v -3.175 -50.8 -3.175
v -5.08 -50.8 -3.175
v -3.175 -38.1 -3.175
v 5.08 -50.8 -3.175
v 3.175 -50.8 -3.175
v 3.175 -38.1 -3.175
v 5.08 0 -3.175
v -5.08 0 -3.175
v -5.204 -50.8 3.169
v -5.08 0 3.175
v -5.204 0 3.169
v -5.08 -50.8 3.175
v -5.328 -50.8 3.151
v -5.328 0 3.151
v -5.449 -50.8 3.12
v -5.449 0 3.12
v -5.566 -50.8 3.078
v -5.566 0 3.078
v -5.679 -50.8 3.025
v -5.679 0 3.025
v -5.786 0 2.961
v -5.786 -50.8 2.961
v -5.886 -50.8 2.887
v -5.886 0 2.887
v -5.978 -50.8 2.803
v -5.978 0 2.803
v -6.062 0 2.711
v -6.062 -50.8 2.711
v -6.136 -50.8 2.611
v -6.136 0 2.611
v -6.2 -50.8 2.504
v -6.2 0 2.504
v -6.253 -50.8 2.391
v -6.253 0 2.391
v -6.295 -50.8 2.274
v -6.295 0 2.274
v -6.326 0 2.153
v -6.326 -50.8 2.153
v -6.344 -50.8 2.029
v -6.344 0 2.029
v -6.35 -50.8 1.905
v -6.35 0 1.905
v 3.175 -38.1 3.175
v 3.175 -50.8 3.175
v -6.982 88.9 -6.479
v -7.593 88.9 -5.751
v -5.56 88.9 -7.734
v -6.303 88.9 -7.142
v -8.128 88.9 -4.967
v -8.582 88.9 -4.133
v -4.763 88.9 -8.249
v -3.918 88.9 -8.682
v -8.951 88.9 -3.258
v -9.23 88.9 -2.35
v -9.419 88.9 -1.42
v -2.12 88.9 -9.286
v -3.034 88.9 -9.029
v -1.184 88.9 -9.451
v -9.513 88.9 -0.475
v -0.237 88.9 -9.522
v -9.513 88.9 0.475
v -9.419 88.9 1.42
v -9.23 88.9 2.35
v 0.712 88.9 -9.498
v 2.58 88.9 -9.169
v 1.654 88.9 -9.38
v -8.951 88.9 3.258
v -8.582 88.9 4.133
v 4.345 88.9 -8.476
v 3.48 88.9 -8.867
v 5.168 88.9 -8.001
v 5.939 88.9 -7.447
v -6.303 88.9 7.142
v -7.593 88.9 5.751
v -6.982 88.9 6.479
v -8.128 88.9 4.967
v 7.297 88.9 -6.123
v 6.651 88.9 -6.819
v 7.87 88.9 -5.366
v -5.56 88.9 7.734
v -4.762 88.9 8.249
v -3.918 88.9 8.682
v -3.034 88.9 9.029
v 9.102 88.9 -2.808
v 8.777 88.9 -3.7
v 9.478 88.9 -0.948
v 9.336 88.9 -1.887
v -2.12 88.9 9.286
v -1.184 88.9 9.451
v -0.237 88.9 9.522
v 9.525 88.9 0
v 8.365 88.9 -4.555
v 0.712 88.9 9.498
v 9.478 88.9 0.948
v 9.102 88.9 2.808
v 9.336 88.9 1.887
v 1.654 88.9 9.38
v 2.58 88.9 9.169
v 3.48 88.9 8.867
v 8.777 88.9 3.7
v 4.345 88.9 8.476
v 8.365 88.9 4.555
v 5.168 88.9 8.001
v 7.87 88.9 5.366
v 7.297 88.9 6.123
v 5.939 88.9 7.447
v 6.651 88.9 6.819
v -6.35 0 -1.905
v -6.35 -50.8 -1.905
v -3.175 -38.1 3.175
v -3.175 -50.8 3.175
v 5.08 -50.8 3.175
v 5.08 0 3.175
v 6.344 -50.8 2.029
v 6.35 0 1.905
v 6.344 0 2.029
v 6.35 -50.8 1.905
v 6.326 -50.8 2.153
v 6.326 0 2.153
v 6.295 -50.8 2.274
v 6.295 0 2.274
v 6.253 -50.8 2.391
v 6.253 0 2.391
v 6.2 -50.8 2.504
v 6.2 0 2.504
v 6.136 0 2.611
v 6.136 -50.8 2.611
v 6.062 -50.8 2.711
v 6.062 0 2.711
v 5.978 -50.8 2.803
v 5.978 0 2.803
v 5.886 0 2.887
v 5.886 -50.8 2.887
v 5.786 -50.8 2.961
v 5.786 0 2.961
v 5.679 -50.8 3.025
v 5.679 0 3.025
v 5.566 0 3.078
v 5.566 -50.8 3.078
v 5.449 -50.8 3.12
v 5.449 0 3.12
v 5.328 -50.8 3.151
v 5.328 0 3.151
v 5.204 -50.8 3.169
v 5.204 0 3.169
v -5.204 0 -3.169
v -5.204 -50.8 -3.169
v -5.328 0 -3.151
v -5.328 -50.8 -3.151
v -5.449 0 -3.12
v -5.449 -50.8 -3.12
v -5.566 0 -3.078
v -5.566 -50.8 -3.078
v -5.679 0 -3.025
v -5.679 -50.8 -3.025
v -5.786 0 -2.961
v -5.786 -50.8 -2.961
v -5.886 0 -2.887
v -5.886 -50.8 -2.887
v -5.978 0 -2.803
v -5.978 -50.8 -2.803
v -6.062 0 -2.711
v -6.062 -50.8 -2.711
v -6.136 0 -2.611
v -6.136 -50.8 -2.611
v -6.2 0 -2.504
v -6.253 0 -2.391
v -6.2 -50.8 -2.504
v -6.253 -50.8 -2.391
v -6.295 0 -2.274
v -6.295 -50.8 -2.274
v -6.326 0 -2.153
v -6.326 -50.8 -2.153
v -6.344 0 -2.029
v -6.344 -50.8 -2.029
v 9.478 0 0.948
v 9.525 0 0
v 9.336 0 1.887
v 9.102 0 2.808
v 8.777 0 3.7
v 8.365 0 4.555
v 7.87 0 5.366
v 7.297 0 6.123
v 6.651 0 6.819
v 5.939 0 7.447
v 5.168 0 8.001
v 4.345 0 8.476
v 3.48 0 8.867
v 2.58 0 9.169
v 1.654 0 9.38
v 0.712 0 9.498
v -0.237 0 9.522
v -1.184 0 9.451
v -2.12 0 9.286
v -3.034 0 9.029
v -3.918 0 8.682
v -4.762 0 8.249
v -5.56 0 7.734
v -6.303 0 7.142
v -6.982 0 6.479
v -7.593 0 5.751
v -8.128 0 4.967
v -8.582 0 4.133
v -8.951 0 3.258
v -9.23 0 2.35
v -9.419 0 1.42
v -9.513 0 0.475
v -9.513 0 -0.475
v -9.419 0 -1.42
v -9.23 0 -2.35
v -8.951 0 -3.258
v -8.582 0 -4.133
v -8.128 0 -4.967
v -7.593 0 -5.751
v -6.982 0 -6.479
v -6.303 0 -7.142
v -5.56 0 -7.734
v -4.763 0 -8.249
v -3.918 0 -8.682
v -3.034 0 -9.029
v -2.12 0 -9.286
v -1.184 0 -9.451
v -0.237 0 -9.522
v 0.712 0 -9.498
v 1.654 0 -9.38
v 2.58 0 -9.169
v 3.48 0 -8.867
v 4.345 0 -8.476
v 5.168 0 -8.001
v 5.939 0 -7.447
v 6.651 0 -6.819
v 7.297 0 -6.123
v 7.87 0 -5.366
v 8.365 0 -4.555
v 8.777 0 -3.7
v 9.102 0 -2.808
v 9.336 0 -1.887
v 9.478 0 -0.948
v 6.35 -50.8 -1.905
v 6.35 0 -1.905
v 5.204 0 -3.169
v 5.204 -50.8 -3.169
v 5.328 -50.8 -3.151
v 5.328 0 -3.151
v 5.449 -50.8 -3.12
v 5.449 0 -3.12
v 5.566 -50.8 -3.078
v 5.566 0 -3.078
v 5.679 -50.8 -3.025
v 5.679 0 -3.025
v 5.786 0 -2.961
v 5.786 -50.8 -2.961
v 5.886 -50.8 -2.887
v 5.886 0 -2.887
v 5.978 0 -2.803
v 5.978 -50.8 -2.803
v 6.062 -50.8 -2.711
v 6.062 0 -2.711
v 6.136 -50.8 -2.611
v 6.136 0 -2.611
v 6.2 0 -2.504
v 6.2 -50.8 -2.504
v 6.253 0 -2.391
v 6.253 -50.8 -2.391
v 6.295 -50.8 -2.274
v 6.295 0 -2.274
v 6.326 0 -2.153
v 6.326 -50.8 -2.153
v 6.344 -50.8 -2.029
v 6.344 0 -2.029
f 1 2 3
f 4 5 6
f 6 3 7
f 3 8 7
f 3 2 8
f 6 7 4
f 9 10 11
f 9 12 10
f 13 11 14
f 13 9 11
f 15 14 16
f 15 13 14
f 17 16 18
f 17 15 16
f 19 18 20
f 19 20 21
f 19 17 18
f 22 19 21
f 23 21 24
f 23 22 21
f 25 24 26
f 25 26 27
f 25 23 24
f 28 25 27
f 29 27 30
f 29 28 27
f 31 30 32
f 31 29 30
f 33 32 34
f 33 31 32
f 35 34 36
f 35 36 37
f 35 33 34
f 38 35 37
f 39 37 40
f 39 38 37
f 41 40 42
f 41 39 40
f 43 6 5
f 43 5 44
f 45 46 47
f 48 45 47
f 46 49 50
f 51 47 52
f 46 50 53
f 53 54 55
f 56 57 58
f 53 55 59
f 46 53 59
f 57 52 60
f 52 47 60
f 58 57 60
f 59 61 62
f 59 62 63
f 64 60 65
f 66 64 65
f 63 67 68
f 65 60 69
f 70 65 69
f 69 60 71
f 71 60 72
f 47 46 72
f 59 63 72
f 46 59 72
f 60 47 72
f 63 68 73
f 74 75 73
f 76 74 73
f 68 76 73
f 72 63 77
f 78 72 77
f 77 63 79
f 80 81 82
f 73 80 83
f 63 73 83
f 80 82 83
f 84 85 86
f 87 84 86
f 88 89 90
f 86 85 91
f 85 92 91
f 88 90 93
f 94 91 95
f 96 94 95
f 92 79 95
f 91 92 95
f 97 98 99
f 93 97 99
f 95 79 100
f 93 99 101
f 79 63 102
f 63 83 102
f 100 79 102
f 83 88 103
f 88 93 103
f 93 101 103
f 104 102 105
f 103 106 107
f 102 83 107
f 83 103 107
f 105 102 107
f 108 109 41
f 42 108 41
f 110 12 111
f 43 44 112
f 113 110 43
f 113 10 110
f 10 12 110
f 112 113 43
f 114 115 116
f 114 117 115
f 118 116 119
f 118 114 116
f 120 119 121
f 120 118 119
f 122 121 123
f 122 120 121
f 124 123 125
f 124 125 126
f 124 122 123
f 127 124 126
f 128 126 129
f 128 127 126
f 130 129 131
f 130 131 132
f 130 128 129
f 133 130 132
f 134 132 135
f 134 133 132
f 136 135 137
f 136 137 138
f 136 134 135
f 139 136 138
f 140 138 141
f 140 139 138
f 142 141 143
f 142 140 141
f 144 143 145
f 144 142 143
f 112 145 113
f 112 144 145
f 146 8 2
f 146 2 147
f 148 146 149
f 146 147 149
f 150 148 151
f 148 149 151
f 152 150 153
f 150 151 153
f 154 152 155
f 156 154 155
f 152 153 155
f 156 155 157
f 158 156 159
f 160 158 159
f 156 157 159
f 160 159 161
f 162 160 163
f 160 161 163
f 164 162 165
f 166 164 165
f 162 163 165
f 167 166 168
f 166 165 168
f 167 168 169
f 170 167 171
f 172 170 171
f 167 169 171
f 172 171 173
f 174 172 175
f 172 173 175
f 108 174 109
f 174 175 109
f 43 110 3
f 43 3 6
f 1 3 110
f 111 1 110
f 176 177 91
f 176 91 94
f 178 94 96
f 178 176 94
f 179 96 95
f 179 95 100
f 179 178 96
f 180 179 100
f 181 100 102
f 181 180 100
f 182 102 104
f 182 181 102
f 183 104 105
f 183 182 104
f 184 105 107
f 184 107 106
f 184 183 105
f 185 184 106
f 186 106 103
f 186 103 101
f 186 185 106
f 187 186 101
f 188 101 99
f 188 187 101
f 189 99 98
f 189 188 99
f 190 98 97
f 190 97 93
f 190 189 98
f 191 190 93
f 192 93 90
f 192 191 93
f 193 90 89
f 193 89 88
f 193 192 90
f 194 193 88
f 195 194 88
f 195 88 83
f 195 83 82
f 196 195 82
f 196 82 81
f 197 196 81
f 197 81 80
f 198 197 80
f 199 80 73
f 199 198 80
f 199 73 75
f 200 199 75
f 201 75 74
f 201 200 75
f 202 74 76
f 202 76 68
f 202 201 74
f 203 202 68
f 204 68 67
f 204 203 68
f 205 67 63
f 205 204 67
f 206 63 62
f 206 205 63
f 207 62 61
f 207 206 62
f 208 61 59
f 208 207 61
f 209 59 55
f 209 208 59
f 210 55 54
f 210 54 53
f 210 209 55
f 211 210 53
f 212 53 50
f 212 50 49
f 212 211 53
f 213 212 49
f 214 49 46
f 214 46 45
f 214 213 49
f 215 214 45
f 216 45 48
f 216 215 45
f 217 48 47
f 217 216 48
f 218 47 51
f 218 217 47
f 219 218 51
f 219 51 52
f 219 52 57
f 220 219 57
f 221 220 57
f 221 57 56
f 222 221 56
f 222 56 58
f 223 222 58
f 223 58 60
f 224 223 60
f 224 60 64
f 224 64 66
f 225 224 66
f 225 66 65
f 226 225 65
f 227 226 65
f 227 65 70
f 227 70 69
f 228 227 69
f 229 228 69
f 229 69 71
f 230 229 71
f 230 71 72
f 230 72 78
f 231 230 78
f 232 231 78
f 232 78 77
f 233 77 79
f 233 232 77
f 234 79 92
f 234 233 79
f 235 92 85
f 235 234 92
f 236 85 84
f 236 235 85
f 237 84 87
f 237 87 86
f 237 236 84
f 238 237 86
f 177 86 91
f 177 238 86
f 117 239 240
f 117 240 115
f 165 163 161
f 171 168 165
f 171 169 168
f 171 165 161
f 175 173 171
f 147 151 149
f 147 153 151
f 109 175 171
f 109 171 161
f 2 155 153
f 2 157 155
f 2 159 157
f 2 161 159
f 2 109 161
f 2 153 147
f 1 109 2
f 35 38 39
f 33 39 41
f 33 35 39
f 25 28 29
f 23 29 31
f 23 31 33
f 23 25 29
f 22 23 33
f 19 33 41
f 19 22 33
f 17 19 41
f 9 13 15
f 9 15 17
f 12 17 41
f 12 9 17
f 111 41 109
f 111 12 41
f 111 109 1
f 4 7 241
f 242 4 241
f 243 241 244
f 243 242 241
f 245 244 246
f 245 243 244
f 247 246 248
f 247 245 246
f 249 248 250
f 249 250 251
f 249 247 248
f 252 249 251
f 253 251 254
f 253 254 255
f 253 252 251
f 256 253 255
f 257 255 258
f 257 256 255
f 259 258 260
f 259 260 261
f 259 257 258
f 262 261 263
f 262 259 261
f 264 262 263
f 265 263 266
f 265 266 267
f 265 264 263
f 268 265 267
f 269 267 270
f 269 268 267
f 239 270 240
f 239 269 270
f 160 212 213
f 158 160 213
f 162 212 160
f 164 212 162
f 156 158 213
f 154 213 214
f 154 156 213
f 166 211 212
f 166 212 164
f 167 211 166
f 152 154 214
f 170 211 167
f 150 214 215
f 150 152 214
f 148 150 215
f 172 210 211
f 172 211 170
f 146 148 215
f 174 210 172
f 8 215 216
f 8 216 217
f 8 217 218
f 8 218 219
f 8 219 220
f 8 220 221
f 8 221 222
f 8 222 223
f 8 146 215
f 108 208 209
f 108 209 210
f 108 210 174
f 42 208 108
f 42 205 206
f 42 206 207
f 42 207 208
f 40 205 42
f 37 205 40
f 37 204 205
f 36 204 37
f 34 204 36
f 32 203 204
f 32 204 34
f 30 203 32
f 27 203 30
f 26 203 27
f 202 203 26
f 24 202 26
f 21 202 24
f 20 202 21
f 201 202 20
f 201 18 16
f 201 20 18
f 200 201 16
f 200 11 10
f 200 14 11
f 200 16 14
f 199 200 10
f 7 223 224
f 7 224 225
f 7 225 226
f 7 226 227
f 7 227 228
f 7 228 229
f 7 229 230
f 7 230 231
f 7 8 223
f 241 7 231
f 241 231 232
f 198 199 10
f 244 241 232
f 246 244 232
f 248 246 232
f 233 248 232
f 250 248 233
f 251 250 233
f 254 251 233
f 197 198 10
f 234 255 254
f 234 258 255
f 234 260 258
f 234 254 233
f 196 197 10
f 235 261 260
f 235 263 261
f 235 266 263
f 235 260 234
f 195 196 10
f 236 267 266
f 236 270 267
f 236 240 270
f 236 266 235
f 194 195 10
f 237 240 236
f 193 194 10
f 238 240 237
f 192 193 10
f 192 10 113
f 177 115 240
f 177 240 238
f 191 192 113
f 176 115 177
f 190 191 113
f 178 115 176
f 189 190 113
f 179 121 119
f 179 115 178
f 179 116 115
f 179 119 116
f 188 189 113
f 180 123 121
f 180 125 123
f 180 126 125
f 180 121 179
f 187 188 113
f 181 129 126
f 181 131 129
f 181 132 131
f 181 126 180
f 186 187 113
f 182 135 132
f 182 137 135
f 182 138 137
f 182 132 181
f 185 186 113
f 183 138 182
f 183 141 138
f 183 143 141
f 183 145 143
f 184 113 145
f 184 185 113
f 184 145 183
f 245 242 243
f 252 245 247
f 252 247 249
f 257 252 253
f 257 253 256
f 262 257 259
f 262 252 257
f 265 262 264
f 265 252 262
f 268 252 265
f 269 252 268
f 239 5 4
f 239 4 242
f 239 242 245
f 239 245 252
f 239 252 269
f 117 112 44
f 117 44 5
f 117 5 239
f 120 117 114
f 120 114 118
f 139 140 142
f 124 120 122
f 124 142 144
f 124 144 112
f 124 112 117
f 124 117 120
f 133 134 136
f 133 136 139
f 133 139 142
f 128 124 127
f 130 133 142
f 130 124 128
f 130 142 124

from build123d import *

# Parameters (mm, degrees)
F0_R     = 9.525
F1_DEPTH = 88.9
F2_W     = 12.7
F2_H     = 6.35
F3_DEPTH = 50.8
F4_W     = 6.35
F4_H     = 6.35
F5_DEPTH = 12.7
F6_R     = 1.27


with BuildPart() as f1:
    # F0 (on Front) → F1 (new body)
    with BuildSketch(Plane.XZ):
        Circle(F0_R)
    extrude(amount=-F1_DEPTH)

    # F2 (on face) → F3 (join)
    with BuildSketch(Plane.XZ):
        Rectangle(F2_W, F2_H)
    extrude(amount=F3_DEPTH)

    # F4 (on face) → F5 (cut)
    with BuildSketch(Plane.XZ.offset(50.8)):
        Rectangle(F4_W, F4_H)
    extrude(amount=-F5_DEPTH, mode=Mode.SUBTRACT)

    # F6
    f6_edges = [f1.edges().sort_by_distance(p)[0] for p in [
        (6.35, -25.4, 3.175),
        (-6.35, -25.4, 3.175),
        (-6.35, -25.4, -3.175),
        (6.35, -25.4, -3.175),
    ]]
    fillet(f6_edges, radius=F6_R)


solid = f1.part
